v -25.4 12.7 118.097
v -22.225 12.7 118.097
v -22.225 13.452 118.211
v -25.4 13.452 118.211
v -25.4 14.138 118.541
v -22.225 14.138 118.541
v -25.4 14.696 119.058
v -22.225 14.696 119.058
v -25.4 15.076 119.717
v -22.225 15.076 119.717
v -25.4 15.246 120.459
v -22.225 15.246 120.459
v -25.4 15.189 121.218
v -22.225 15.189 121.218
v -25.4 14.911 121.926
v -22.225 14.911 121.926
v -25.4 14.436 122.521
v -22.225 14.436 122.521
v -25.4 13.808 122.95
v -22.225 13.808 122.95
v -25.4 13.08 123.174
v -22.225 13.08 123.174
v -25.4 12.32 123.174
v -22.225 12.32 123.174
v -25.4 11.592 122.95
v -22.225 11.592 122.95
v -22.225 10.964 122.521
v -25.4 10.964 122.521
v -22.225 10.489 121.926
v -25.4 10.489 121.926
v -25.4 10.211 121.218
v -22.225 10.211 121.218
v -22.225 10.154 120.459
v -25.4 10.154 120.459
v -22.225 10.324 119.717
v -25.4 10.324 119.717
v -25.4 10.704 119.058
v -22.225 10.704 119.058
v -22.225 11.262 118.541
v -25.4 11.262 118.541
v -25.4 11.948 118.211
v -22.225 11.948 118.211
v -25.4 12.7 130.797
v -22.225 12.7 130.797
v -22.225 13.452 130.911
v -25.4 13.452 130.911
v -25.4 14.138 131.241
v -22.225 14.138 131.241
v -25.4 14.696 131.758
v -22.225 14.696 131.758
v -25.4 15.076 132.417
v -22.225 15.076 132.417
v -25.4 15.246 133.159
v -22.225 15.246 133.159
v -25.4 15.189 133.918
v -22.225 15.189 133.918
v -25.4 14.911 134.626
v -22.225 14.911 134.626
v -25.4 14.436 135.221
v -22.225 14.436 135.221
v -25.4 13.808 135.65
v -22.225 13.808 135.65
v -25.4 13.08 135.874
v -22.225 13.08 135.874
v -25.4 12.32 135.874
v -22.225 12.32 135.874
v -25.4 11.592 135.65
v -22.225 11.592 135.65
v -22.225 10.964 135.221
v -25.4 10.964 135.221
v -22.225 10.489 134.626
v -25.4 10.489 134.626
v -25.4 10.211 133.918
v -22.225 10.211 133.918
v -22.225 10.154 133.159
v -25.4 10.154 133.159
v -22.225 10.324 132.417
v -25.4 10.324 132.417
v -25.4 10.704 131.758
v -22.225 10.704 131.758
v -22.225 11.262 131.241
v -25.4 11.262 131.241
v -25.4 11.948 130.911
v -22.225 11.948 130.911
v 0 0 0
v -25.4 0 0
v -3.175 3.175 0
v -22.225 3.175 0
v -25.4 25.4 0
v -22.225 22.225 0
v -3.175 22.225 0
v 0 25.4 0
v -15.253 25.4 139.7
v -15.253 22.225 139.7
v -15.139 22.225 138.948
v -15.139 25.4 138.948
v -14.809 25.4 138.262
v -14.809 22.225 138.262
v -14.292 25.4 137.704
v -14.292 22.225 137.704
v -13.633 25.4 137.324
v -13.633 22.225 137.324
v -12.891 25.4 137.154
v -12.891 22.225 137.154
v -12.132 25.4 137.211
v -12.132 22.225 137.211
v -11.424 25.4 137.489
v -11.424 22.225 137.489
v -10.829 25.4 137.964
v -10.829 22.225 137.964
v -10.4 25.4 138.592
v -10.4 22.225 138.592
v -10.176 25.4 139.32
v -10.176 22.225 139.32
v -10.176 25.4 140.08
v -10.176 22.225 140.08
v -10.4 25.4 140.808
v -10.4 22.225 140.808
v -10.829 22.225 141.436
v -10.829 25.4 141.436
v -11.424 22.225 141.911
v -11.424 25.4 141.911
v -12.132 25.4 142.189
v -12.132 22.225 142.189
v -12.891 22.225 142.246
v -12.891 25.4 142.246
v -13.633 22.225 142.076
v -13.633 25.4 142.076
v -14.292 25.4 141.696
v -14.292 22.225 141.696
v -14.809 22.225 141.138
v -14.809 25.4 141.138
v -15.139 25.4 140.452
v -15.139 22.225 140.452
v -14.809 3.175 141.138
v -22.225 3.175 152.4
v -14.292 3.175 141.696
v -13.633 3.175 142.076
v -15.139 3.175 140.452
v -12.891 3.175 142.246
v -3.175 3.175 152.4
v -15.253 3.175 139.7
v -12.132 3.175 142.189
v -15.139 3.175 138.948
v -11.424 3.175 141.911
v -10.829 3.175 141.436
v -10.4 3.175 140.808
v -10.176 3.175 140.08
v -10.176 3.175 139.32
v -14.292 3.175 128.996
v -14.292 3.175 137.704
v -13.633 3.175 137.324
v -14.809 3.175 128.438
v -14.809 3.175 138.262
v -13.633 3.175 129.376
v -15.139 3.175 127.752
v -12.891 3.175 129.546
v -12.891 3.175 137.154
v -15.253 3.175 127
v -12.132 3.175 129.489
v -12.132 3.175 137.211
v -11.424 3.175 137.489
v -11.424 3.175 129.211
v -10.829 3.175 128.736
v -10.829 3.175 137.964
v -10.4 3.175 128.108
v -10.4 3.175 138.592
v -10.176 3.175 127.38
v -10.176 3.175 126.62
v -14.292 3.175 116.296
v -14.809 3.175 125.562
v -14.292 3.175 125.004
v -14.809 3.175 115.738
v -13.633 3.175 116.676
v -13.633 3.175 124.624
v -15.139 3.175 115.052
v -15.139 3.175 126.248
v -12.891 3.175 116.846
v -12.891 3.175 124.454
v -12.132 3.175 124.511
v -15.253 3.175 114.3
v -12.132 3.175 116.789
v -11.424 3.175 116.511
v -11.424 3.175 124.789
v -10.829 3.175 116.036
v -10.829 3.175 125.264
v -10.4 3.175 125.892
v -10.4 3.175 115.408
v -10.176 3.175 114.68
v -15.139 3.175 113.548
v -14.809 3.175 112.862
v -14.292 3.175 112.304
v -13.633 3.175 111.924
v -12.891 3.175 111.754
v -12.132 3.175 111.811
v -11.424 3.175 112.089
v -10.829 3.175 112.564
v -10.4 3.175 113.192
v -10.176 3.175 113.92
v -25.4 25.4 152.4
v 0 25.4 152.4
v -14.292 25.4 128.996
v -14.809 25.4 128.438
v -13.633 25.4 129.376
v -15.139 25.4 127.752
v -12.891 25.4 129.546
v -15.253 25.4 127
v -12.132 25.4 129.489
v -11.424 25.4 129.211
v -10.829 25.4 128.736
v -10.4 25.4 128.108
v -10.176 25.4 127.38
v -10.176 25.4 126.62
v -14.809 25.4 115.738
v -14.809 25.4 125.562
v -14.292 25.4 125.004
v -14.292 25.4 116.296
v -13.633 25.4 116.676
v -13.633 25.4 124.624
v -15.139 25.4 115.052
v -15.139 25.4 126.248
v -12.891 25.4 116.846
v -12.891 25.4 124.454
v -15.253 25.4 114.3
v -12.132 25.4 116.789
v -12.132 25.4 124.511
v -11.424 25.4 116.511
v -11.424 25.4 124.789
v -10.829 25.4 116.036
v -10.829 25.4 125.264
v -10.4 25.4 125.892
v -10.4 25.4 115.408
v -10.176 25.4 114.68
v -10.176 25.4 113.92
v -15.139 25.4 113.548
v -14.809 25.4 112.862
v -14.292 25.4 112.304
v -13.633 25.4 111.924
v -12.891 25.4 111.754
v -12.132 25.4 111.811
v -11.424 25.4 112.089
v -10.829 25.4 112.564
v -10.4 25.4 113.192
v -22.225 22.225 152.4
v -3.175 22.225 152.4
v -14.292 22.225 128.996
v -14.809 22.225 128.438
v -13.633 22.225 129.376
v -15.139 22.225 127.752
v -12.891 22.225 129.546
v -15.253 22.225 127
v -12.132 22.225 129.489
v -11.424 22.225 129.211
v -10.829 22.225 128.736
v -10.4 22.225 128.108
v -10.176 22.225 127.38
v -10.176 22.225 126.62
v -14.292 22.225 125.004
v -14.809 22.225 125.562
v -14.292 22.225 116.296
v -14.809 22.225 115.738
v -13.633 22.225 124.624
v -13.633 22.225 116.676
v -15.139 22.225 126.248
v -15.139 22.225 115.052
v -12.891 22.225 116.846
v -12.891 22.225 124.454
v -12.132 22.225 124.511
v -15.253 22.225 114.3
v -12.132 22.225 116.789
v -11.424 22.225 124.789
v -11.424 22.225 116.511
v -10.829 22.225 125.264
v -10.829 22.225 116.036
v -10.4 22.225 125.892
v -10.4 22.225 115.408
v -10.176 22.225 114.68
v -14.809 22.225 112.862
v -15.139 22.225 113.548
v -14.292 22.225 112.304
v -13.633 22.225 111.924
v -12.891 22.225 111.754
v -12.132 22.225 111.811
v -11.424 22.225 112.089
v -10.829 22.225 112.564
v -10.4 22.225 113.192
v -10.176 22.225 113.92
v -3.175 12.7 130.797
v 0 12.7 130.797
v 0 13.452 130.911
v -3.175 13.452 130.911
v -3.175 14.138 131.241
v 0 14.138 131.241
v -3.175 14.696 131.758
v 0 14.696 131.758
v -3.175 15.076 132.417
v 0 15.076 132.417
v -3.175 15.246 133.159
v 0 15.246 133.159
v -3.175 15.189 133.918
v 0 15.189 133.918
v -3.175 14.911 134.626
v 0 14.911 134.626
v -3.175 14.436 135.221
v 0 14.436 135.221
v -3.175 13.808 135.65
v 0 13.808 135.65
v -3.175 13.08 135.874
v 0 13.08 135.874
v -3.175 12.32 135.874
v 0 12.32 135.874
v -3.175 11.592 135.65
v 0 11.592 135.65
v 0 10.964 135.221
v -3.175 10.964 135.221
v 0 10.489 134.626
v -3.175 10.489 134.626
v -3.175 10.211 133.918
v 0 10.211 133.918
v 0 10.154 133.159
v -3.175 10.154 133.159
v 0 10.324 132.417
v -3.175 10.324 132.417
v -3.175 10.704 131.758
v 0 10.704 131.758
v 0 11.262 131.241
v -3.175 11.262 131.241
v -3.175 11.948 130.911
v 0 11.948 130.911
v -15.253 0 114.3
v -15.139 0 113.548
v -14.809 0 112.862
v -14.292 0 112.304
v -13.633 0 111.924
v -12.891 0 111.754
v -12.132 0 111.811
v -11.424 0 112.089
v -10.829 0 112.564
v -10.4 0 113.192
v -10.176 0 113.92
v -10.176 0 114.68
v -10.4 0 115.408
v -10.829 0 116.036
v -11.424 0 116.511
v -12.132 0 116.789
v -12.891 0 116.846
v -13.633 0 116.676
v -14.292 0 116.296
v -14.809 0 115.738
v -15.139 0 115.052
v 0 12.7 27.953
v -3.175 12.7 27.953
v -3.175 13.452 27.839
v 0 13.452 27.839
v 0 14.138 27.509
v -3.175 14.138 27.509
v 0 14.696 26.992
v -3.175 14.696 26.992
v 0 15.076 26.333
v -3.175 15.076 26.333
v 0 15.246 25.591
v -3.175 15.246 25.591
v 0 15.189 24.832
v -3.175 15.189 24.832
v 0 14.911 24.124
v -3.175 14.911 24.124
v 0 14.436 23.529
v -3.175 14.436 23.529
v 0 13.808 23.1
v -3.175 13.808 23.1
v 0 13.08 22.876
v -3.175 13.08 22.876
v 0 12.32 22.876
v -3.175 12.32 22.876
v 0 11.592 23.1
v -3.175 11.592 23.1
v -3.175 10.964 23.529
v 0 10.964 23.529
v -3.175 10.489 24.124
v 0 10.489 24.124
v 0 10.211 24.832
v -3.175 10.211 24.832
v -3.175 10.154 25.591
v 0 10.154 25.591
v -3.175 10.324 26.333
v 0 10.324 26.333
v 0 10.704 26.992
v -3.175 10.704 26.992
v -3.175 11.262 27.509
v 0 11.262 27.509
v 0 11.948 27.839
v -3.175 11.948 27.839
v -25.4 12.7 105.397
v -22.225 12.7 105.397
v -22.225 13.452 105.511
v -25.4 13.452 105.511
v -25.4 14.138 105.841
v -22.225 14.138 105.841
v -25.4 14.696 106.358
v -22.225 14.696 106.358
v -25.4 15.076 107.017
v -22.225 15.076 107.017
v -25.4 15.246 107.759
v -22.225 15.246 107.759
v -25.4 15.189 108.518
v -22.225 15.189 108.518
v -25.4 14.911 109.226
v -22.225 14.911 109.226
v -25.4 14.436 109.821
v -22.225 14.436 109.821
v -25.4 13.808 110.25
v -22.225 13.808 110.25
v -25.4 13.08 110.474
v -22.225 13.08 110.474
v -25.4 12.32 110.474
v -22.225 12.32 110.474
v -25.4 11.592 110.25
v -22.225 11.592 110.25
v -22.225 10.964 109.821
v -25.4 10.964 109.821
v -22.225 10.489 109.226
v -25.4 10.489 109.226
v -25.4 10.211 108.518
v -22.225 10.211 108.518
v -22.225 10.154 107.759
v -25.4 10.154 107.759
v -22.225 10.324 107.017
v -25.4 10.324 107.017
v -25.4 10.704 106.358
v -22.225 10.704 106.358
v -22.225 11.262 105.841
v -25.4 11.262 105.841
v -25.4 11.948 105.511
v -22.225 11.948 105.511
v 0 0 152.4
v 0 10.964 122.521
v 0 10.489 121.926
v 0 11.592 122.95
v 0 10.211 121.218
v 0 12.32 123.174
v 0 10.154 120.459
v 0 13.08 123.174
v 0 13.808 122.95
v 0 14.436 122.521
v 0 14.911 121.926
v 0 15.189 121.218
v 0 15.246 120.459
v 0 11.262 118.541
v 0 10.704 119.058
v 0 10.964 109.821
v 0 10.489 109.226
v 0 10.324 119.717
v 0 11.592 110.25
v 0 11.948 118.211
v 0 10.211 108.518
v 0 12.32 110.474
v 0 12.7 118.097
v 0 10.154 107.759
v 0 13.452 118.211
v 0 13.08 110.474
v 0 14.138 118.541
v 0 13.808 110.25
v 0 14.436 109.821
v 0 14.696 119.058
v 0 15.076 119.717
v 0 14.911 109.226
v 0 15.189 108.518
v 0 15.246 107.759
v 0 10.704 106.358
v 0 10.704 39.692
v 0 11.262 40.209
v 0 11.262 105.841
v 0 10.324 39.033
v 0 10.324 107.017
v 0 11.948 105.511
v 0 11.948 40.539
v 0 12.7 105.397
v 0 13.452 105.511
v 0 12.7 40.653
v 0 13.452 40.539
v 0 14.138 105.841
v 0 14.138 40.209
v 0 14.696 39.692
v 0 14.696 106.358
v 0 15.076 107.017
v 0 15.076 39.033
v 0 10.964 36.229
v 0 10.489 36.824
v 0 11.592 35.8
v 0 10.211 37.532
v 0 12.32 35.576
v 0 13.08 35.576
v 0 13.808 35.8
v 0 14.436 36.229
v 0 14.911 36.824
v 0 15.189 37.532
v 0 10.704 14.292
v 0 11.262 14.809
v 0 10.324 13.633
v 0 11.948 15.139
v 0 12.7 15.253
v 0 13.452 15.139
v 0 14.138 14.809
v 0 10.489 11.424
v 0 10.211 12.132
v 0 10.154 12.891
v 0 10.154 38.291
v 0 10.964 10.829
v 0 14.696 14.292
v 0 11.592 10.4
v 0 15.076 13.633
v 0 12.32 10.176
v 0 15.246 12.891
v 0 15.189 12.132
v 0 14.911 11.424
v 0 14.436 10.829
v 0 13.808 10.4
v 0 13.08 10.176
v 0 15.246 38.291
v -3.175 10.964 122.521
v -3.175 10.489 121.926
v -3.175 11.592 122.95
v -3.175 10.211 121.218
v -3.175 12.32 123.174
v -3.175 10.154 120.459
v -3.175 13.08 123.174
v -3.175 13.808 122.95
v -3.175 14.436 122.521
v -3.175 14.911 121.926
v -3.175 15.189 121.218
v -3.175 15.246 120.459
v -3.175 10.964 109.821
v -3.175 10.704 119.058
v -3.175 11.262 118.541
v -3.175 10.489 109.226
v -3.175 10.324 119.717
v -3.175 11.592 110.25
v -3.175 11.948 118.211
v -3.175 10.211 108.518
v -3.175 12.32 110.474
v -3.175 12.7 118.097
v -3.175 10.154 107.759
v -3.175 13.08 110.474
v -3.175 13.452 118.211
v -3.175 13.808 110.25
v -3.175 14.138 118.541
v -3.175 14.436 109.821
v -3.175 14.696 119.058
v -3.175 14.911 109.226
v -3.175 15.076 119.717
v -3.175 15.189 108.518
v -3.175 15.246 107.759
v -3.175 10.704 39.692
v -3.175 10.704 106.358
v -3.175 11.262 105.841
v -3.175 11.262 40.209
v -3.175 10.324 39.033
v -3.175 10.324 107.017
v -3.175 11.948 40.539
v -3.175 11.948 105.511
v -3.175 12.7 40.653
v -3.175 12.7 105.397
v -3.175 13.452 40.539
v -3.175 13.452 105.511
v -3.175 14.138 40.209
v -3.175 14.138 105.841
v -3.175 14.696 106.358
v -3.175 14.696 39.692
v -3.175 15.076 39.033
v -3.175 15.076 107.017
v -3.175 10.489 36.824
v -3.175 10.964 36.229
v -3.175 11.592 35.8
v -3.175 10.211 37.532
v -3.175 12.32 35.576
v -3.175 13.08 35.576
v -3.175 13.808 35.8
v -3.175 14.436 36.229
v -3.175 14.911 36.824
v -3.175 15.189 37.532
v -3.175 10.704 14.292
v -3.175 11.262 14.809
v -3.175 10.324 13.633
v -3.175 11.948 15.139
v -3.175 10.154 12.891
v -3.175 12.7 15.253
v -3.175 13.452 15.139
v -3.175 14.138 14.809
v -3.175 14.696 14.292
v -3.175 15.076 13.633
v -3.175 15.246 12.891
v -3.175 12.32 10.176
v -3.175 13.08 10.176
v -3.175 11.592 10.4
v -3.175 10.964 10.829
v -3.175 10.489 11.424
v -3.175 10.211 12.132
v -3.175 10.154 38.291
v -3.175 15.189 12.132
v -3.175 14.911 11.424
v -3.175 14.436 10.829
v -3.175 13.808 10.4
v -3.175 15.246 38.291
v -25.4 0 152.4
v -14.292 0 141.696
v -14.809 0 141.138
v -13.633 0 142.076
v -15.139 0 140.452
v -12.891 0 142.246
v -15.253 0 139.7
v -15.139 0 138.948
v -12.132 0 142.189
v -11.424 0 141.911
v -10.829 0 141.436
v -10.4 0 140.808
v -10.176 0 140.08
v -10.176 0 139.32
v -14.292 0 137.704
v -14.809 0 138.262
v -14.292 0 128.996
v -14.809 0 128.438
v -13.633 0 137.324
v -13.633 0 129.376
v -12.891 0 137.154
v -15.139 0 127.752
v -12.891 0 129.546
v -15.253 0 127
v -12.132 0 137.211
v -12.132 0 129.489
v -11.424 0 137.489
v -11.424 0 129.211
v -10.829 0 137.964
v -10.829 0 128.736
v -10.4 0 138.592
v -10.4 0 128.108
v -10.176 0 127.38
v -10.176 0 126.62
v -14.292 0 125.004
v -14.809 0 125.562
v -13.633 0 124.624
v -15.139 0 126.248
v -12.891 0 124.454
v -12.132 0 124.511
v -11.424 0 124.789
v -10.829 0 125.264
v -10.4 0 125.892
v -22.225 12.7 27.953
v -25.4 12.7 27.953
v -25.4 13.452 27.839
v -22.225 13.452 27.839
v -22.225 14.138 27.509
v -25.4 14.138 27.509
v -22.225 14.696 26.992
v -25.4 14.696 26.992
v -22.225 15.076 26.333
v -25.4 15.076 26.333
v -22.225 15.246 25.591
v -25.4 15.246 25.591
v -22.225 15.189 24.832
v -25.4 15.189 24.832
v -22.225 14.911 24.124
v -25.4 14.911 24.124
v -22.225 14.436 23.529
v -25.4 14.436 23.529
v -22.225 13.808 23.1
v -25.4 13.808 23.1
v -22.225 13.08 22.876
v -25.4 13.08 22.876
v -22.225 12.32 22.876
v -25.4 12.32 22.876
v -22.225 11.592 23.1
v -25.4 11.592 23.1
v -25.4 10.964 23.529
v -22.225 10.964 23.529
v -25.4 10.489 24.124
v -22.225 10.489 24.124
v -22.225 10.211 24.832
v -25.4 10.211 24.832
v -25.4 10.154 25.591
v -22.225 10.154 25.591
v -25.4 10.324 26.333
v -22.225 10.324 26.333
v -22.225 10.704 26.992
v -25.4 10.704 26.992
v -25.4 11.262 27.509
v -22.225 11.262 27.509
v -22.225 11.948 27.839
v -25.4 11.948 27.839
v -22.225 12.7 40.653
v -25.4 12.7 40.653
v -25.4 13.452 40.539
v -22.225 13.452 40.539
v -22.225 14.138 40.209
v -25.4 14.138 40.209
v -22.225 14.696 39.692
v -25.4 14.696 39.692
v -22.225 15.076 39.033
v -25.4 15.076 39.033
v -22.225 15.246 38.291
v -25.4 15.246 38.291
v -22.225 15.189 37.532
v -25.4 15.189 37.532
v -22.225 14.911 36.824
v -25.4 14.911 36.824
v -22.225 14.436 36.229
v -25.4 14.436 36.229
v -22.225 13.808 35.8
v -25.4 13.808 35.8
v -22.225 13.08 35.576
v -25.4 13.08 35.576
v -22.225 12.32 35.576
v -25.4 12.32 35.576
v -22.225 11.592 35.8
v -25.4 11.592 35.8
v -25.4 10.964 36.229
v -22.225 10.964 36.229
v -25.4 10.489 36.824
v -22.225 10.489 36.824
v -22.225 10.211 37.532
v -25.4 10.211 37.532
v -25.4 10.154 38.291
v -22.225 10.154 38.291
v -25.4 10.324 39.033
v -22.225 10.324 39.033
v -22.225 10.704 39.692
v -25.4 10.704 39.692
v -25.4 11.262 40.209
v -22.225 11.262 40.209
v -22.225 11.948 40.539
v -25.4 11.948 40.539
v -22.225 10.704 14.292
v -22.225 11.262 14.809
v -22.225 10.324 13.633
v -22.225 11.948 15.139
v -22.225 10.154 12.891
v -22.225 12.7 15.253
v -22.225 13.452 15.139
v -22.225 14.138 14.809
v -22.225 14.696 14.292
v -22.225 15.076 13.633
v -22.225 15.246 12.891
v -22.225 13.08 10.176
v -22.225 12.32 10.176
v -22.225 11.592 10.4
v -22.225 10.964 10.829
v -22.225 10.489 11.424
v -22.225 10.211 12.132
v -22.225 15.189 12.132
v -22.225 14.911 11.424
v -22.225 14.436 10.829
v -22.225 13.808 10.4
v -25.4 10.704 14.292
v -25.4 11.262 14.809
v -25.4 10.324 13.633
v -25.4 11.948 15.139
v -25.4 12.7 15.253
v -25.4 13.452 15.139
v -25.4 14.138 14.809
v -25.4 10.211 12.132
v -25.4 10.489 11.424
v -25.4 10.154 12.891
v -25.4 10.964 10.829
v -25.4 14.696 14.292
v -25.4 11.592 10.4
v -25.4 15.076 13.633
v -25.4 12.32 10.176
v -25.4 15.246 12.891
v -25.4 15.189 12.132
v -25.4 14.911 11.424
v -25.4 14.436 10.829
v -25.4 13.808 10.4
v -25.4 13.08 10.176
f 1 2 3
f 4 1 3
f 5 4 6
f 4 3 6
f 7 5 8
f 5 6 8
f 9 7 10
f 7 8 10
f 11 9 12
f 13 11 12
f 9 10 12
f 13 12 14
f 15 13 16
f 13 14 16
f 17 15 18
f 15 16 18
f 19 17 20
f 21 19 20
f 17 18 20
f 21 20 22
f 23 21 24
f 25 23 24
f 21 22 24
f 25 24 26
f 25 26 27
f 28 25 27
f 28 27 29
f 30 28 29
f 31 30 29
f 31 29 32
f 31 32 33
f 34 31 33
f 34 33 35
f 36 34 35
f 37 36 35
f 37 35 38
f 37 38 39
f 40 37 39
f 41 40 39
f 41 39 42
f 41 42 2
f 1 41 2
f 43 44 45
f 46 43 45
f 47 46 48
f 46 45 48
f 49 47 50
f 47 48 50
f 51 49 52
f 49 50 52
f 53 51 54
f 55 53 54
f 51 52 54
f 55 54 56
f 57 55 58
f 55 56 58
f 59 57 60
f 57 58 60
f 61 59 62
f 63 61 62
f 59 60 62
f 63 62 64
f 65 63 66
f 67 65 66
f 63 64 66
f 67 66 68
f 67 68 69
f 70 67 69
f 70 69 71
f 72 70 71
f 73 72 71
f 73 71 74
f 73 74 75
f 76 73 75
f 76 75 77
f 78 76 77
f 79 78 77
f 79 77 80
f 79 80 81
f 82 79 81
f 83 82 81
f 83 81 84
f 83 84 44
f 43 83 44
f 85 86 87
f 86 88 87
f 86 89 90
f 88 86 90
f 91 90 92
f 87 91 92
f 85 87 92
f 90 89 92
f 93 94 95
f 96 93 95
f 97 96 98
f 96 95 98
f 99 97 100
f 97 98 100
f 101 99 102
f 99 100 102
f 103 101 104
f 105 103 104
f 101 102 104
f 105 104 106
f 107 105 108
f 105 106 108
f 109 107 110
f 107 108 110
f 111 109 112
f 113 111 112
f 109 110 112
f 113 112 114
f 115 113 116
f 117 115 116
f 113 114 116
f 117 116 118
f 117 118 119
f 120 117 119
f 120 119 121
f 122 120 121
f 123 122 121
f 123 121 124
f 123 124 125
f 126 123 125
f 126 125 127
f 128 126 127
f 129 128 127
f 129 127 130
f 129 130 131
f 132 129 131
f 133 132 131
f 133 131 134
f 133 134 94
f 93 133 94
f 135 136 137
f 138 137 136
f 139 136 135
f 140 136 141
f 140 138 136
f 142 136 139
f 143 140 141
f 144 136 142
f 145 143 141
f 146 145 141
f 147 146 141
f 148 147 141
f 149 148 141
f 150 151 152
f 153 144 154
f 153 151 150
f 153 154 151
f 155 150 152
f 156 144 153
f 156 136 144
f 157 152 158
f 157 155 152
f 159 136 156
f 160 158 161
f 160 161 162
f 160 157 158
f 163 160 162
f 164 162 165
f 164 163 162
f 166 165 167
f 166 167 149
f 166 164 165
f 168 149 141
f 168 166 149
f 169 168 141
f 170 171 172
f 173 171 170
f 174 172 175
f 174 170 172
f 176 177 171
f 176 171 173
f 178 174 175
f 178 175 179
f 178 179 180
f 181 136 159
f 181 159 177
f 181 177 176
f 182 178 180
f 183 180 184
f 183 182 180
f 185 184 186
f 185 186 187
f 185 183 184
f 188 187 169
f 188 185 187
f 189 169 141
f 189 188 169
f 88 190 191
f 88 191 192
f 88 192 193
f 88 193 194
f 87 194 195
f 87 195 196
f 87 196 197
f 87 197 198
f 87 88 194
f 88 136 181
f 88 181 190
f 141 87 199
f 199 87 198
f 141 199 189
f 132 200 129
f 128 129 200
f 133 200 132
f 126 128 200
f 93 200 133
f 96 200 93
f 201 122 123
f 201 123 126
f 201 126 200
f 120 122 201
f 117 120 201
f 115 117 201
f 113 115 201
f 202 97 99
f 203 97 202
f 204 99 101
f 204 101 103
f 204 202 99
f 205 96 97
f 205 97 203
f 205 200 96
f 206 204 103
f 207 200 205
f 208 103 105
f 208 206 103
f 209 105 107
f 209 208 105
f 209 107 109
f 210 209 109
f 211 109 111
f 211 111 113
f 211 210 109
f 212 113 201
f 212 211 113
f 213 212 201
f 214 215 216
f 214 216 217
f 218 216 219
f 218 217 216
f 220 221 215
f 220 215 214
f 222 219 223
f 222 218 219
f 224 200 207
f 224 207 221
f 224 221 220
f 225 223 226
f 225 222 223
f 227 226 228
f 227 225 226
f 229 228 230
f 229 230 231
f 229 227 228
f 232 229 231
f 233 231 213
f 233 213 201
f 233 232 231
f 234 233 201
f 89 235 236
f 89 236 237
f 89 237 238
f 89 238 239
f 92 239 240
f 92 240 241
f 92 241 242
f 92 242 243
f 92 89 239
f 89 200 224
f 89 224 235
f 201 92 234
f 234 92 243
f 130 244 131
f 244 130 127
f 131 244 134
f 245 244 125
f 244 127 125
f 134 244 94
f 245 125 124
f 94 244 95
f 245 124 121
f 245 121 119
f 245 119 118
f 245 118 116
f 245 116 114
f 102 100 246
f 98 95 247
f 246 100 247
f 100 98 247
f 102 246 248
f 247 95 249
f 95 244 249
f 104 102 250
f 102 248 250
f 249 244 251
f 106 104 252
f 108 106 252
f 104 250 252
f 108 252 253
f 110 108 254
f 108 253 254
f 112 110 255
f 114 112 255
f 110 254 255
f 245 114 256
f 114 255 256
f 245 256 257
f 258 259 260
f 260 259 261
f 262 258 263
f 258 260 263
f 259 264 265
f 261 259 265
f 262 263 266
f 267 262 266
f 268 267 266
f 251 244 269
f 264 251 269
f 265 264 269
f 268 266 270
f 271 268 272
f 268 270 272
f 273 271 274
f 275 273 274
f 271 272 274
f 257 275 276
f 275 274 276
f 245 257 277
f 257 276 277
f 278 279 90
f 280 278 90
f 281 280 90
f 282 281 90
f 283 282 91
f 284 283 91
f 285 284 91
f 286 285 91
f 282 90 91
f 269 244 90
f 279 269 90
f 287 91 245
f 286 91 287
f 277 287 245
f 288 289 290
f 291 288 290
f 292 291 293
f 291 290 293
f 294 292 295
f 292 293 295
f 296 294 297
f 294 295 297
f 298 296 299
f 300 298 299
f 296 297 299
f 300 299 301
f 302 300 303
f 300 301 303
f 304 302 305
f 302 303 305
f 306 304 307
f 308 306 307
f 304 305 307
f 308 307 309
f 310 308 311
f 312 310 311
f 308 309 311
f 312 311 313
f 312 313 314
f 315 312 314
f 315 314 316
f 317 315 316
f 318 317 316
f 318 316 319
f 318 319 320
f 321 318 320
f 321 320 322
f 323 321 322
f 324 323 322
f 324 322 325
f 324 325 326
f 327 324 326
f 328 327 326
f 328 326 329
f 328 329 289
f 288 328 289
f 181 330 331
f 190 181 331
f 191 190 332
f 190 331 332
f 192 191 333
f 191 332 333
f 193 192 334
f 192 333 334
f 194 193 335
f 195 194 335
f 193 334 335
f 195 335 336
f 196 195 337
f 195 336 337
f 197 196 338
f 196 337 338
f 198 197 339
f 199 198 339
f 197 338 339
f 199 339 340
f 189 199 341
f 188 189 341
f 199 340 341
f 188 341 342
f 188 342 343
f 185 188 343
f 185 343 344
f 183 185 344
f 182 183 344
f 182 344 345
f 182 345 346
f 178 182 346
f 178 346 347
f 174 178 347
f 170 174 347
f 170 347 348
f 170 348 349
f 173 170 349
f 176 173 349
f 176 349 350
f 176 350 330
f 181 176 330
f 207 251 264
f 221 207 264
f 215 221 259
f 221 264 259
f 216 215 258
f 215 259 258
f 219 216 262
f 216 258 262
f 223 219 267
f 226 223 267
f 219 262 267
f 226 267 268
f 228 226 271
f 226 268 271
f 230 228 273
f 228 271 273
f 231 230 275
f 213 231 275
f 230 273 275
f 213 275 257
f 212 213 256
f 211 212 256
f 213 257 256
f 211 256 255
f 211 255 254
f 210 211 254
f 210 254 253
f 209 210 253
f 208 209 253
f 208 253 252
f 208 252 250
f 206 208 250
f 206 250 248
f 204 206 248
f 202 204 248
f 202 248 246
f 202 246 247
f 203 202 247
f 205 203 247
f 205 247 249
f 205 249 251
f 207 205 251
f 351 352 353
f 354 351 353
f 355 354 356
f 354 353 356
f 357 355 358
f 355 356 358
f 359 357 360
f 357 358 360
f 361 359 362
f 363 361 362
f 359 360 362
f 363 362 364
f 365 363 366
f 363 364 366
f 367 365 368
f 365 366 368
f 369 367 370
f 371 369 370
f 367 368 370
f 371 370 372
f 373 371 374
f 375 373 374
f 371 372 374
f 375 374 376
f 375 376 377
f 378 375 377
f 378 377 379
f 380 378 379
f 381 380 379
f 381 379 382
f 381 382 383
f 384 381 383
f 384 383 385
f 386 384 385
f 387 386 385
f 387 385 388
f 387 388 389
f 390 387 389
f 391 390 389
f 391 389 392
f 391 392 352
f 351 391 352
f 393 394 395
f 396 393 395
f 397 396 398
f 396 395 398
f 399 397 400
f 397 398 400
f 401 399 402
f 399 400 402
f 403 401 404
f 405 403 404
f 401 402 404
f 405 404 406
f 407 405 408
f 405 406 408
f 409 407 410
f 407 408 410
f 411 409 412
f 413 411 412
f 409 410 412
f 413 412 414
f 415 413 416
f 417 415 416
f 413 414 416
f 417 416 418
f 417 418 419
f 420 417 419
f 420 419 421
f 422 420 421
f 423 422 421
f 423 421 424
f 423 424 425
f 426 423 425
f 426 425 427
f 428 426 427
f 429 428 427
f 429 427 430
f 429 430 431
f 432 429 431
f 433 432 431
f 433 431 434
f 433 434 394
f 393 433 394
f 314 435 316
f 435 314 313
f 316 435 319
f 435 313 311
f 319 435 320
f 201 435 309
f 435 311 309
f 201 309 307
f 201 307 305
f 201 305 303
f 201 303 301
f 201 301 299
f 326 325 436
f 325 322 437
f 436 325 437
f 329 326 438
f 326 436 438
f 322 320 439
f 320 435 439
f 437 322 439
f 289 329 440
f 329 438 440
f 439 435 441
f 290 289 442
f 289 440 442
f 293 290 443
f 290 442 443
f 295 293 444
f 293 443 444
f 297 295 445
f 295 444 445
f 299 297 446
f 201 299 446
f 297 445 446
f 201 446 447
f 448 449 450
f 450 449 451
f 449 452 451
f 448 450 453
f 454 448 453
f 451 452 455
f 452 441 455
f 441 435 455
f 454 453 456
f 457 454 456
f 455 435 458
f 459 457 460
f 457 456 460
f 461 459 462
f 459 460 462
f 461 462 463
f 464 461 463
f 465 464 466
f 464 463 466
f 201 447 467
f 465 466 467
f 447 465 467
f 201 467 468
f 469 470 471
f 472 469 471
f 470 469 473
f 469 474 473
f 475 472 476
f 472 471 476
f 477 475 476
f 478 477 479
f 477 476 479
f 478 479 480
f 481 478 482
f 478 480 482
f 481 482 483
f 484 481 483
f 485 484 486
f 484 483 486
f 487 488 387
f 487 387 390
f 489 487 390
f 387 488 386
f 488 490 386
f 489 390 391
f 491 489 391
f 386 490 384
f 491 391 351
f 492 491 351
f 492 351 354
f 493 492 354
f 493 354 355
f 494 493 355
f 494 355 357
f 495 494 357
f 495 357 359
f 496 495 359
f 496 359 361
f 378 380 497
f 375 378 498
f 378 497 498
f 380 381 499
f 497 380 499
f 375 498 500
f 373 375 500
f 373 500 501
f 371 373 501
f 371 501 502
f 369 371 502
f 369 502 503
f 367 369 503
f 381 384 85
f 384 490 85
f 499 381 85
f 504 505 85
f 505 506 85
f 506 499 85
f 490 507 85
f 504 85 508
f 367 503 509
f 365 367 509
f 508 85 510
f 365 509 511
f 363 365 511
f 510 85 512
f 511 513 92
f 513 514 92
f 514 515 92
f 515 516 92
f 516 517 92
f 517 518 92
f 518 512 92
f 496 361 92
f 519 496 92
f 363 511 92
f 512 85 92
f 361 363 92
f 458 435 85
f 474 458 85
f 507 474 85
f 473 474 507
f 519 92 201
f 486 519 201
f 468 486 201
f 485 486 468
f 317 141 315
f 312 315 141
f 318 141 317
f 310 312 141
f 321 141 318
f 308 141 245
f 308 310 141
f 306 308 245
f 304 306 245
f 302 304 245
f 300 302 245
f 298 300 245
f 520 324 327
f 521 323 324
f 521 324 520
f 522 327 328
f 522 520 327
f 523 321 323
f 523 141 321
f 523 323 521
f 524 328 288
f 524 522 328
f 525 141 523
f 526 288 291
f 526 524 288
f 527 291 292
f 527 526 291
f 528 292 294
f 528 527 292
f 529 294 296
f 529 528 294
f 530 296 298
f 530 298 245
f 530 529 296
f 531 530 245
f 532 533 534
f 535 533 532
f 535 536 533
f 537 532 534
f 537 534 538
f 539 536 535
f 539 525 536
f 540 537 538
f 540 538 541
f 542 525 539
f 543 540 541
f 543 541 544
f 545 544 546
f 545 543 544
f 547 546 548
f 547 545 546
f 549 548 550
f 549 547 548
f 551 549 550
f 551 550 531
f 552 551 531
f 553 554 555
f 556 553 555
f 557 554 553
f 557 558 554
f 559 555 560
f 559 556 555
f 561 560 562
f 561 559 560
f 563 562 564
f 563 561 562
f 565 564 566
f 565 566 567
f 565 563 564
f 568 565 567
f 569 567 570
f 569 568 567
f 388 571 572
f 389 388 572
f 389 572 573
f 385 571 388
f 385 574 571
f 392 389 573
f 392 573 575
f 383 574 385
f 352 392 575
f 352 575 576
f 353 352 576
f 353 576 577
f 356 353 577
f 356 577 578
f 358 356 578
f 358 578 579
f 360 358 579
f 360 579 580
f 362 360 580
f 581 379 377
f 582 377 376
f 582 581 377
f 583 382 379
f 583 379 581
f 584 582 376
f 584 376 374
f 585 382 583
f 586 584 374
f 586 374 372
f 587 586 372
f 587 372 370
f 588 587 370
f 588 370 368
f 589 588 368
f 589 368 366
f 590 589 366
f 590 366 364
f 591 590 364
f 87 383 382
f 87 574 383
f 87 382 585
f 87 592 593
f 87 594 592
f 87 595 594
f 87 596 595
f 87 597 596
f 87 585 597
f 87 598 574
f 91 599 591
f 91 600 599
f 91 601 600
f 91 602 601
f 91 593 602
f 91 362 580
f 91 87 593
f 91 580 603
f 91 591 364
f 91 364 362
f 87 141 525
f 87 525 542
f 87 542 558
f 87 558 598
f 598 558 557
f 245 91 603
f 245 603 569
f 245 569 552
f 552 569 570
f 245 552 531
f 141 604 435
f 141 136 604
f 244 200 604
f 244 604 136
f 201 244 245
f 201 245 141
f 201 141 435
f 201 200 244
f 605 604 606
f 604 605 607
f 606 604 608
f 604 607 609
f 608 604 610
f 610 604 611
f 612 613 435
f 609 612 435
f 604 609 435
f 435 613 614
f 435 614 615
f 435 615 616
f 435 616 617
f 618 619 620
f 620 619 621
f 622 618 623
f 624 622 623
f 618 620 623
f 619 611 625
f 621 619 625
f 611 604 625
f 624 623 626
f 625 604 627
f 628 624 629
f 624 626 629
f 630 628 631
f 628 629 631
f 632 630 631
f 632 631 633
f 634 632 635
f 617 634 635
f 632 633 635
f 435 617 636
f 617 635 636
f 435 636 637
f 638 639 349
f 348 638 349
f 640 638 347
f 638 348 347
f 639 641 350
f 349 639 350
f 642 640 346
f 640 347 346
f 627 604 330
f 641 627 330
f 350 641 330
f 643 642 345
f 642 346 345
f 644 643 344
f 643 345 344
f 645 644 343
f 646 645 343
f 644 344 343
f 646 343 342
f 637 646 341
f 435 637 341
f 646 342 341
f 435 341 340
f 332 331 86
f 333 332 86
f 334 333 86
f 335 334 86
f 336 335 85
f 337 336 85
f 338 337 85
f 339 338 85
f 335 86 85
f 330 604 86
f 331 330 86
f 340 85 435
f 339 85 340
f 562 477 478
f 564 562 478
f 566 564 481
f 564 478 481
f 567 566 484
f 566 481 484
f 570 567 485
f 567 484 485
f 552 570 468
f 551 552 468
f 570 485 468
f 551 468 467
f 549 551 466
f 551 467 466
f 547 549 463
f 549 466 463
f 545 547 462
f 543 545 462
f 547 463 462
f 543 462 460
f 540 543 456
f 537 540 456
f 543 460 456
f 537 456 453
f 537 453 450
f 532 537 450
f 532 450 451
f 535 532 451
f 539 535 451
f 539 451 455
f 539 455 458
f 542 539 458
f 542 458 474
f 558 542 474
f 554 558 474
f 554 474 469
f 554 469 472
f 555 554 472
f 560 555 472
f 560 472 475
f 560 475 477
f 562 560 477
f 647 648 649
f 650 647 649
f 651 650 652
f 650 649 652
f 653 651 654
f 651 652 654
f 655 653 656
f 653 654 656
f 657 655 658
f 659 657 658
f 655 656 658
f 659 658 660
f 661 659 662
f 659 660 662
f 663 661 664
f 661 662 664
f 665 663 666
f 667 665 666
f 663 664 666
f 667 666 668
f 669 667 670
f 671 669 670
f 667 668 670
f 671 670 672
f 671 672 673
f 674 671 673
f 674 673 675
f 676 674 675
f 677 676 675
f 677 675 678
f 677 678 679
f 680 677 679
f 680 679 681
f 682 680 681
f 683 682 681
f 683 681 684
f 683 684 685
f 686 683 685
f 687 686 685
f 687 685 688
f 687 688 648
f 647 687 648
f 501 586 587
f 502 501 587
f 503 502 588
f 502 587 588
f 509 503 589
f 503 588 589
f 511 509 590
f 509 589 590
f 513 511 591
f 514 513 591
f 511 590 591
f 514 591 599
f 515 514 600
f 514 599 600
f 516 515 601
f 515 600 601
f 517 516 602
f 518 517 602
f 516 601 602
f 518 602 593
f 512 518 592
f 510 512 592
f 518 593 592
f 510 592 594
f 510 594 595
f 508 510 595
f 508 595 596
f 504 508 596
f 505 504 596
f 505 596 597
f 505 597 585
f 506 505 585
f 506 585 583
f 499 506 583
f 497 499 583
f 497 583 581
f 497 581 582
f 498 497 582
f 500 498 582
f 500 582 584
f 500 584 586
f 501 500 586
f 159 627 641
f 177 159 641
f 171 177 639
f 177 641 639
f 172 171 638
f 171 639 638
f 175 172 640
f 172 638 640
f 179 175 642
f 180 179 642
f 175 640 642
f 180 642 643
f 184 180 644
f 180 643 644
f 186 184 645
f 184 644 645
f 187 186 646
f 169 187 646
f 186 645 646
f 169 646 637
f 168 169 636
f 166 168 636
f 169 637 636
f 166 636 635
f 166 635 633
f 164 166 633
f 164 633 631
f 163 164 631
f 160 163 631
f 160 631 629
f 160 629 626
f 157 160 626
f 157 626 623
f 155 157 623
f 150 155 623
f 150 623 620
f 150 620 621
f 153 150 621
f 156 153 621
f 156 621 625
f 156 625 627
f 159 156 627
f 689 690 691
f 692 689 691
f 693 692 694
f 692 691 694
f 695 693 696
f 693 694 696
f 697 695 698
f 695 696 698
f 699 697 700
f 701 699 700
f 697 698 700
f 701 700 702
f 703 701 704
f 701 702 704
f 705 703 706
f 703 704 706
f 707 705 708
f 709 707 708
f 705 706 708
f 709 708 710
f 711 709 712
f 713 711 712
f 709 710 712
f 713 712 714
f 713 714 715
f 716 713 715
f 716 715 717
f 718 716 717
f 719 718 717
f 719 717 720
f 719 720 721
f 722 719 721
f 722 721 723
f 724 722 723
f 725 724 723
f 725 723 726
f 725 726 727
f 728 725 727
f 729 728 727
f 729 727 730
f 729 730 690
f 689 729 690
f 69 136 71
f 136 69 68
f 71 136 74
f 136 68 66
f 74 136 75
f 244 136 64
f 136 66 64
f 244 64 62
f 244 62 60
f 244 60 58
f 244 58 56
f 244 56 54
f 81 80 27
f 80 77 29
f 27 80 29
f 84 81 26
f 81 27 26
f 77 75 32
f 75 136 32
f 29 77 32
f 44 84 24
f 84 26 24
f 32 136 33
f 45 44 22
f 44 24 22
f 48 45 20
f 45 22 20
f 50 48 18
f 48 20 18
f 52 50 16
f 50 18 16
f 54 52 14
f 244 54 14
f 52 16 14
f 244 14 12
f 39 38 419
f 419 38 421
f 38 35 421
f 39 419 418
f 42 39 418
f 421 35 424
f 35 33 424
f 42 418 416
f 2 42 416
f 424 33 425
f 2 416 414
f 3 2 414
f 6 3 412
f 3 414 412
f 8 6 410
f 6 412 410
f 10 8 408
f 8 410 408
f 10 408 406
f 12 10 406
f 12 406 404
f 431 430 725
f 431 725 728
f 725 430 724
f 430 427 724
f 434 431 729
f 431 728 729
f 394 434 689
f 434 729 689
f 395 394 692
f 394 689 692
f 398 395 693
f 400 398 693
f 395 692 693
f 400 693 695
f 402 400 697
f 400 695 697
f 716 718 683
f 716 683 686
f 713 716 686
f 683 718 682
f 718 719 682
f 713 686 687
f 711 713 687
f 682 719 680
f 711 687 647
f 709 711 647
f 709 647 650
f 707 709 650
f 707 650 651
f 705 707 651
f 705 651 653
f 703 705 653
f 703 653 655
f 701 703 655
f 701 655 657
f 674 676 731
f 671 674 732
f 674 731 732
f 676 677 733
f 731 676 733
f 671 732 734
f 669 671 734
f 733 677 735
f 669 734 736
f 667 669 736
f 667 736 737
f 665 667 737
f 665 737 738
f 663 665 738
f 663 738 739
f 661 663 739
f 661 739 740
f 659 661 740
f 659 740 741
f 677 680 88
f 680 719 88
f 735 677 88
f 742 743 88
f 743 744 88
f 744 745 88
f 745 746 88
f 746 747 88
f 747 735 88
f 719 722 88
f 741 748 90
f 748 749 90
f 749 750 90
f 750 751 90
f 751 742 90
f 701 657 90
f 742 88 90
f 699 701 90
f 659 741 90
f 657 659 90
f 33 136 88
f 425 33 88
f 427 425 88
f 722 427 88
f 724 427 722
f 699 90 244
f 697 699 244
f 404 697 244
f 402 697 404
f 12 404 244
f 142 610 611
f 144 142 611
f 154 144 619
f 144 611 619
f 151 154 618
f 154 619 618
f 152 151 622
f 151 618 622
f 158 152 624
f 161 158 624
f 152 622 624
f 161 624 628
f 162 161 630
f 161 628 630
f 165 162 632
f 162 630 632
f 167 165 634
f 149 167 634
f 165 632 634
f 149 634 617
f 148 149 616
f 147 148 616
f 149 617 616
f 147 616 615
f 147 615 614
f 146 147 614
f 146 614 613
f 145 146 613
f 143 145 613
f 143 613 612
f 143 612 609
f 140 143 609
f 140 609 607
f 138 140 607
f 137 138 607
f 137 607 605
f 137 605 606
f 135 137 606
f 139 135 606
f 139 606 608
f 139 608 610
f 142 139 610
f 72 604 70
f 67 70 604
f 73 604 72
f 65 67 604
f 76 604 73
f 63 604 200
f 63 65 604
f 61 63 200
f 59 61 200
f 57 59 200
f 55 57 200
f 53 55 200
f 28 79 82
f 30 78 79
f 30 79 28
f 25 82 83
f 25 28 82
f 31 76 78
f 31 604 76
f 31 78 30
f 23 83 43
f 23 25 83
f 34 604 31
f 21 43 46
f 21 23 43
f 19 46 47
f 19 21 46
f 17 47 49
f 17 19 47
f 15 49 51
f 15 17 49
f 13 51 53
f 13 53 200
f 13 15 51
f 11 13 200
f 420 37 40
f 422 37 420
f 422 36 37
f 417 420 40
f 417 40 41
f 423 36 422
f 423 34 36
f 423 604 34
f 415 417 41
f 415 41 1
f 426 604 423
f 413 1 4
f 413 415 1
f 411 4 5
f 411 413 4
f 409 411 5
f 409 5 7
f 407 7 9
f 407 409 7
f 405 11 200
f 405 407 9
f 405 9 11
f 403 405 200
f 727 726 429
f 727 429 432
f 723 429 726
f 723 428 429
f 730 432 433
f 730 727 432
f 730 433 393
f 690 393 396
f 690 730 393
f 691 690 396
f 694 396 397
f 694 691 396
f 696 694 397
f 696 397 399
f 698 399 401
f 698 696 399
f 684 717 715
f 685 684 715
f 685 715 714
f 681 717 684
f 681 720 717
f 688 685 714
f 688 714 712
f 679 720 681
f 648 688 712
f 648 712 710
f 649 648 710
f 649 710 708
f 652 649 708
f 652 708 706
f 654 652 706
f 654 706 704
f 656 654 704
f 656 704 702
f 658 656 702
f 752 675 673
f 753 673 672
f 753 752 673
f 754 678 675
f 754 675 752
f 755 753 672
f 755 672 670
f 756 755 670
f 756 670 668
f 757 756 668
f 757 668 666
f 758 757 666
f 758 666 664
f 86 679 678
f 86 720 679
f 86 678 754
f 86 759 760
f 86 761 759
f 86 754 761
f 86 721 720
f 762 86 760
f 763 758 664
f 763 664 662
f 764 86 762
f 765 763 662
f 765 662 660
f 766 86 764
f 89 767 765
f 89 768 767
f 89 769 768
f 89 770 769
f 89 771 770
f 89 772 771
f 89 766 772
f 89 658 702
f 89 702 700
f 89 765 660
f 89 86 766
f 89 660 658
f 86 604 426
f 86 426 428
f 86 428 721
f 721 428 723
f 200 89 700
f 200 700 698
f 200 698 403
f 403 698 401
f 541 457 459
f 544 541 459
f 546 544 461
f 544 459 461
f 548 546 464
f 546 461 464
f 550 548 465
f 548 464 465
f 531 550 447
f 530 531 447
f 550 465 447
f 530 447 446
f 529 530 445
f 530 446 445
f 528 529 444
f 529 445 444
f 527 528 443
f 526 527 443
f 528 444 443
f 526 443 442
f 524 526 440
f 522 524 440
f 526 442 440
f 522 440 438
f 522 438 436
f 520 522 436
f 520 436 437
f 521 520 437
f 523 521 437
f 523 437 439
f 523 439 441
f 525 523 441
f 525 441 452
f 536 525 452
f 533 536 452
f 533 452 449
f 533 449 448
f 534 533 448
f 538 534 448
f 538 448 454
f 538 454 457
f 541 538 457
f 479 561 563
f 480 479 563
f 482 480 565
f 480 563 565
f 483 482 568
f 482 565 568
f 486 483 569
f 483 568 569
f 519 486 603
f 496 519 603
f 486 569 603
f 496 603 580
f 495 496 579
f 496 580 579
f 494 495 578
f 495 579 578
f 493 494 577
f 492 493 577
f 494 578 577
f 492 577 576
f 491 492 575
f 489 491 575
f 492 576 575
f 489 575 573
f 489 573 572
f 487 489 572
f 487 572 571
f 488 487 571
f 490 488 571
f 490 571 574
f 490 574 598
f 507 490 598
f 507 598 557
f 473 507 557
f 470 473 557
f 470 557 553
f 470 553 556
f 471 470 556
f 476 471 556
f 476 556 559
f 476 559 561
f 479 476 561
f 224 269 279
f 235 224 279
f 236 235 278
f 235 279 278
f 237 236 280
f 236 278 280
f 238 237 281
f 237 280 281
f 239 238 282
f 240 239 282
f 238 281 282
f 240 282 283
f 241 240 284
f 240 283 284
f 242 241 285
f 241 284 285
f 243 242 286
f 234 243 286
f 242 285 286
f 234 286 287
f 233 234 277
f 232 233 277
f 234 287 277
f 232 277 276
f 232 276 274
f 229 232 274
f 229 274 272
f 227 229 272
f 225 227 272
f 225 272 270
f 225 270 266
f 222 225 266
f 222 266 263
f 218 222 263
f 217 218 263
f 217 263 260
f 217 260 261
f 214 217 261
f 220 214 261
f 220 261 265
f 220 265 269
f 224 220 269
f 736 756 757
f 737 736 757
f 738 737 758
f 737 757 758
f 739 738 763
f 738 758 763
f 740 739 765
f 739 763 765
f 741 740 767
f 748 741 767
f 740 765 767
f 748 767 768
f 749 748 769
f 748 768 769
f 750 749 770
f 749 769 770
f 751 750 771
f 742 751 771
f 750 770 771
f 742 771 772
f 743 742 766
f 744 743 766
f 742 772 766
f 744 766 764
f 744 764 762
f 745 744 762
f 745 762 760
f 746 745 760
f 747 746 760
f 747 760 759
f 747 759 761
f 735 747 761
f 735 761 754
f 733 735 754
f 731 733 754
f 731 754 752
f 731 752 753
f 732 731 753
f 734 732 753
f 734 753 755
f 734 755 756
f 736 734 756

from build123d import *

# Parameters (mm, degrees)
SKETCH3_W              = 25.4
SKETCH3_H              = 25.4
SKETCH3_W_2            = 19.05
SKETCH3_H_2            = 19.05
BOSS_EXTRUDE1_DEPTH    = 152.4
F_10_CLEARANCE_HOLE1_D = 5.1054
F_10_CLEARANCE_HOLE2_D = 5.1054
F_10_CLEARANCE_HOLE3_D = 5.1054


with BuildPart() as part:
    # Sketch3 → Boss-Extrude1 (new body)
    with BuildSketch(Plane.XY):
        with Locations((-12.7, 12.7)):
            Rectangle(SKETCH3_W, SKETCH3_H)
        with Locations((-12.7, 12.7)):
            Rectangle(SKETCH3_W_2, SKETCH3_H_2, mode=Mode.SUBTRACT)
    extrude(amount=BOSS_EXTRUDE1_DEPTH)

    # #10 Clearance Hole1 (through all)
    with Locations(Plane(origin=(0, 25.4, 0), x_dir=(1, 0, 0), z_dir=(0, 1, 0))):
        with Locations((-12.7, -139.7), (-12.7, -127), (-12.7, -114.3)):
            Hole(F_10_CLEARANCE_HOLE1_D / 2)

    # #10 Clearance Hole2 (through all)
    with Locations(Plane.ZY.offset(25.4)):
        with Locations((133.35, 12.7), (120.65, 12.7), (107.95, 12.7)):
            Hole(F_10_CLEARANCE_HOLE2_D / 2)

    # #10 Clearance Hole3 (through all)
    with Locations(Plane(origin=(0, 0, 0), x_dir=(0, 0, -1), z_dir=(1, 0, 0))):
        with Locations((-12.7, 12.7), (-25.4, 12.7), (-38.1, 12.7)):
            Hole(F_10_CLEARANCE_HOLE3_D / 2)


solid = part.part
